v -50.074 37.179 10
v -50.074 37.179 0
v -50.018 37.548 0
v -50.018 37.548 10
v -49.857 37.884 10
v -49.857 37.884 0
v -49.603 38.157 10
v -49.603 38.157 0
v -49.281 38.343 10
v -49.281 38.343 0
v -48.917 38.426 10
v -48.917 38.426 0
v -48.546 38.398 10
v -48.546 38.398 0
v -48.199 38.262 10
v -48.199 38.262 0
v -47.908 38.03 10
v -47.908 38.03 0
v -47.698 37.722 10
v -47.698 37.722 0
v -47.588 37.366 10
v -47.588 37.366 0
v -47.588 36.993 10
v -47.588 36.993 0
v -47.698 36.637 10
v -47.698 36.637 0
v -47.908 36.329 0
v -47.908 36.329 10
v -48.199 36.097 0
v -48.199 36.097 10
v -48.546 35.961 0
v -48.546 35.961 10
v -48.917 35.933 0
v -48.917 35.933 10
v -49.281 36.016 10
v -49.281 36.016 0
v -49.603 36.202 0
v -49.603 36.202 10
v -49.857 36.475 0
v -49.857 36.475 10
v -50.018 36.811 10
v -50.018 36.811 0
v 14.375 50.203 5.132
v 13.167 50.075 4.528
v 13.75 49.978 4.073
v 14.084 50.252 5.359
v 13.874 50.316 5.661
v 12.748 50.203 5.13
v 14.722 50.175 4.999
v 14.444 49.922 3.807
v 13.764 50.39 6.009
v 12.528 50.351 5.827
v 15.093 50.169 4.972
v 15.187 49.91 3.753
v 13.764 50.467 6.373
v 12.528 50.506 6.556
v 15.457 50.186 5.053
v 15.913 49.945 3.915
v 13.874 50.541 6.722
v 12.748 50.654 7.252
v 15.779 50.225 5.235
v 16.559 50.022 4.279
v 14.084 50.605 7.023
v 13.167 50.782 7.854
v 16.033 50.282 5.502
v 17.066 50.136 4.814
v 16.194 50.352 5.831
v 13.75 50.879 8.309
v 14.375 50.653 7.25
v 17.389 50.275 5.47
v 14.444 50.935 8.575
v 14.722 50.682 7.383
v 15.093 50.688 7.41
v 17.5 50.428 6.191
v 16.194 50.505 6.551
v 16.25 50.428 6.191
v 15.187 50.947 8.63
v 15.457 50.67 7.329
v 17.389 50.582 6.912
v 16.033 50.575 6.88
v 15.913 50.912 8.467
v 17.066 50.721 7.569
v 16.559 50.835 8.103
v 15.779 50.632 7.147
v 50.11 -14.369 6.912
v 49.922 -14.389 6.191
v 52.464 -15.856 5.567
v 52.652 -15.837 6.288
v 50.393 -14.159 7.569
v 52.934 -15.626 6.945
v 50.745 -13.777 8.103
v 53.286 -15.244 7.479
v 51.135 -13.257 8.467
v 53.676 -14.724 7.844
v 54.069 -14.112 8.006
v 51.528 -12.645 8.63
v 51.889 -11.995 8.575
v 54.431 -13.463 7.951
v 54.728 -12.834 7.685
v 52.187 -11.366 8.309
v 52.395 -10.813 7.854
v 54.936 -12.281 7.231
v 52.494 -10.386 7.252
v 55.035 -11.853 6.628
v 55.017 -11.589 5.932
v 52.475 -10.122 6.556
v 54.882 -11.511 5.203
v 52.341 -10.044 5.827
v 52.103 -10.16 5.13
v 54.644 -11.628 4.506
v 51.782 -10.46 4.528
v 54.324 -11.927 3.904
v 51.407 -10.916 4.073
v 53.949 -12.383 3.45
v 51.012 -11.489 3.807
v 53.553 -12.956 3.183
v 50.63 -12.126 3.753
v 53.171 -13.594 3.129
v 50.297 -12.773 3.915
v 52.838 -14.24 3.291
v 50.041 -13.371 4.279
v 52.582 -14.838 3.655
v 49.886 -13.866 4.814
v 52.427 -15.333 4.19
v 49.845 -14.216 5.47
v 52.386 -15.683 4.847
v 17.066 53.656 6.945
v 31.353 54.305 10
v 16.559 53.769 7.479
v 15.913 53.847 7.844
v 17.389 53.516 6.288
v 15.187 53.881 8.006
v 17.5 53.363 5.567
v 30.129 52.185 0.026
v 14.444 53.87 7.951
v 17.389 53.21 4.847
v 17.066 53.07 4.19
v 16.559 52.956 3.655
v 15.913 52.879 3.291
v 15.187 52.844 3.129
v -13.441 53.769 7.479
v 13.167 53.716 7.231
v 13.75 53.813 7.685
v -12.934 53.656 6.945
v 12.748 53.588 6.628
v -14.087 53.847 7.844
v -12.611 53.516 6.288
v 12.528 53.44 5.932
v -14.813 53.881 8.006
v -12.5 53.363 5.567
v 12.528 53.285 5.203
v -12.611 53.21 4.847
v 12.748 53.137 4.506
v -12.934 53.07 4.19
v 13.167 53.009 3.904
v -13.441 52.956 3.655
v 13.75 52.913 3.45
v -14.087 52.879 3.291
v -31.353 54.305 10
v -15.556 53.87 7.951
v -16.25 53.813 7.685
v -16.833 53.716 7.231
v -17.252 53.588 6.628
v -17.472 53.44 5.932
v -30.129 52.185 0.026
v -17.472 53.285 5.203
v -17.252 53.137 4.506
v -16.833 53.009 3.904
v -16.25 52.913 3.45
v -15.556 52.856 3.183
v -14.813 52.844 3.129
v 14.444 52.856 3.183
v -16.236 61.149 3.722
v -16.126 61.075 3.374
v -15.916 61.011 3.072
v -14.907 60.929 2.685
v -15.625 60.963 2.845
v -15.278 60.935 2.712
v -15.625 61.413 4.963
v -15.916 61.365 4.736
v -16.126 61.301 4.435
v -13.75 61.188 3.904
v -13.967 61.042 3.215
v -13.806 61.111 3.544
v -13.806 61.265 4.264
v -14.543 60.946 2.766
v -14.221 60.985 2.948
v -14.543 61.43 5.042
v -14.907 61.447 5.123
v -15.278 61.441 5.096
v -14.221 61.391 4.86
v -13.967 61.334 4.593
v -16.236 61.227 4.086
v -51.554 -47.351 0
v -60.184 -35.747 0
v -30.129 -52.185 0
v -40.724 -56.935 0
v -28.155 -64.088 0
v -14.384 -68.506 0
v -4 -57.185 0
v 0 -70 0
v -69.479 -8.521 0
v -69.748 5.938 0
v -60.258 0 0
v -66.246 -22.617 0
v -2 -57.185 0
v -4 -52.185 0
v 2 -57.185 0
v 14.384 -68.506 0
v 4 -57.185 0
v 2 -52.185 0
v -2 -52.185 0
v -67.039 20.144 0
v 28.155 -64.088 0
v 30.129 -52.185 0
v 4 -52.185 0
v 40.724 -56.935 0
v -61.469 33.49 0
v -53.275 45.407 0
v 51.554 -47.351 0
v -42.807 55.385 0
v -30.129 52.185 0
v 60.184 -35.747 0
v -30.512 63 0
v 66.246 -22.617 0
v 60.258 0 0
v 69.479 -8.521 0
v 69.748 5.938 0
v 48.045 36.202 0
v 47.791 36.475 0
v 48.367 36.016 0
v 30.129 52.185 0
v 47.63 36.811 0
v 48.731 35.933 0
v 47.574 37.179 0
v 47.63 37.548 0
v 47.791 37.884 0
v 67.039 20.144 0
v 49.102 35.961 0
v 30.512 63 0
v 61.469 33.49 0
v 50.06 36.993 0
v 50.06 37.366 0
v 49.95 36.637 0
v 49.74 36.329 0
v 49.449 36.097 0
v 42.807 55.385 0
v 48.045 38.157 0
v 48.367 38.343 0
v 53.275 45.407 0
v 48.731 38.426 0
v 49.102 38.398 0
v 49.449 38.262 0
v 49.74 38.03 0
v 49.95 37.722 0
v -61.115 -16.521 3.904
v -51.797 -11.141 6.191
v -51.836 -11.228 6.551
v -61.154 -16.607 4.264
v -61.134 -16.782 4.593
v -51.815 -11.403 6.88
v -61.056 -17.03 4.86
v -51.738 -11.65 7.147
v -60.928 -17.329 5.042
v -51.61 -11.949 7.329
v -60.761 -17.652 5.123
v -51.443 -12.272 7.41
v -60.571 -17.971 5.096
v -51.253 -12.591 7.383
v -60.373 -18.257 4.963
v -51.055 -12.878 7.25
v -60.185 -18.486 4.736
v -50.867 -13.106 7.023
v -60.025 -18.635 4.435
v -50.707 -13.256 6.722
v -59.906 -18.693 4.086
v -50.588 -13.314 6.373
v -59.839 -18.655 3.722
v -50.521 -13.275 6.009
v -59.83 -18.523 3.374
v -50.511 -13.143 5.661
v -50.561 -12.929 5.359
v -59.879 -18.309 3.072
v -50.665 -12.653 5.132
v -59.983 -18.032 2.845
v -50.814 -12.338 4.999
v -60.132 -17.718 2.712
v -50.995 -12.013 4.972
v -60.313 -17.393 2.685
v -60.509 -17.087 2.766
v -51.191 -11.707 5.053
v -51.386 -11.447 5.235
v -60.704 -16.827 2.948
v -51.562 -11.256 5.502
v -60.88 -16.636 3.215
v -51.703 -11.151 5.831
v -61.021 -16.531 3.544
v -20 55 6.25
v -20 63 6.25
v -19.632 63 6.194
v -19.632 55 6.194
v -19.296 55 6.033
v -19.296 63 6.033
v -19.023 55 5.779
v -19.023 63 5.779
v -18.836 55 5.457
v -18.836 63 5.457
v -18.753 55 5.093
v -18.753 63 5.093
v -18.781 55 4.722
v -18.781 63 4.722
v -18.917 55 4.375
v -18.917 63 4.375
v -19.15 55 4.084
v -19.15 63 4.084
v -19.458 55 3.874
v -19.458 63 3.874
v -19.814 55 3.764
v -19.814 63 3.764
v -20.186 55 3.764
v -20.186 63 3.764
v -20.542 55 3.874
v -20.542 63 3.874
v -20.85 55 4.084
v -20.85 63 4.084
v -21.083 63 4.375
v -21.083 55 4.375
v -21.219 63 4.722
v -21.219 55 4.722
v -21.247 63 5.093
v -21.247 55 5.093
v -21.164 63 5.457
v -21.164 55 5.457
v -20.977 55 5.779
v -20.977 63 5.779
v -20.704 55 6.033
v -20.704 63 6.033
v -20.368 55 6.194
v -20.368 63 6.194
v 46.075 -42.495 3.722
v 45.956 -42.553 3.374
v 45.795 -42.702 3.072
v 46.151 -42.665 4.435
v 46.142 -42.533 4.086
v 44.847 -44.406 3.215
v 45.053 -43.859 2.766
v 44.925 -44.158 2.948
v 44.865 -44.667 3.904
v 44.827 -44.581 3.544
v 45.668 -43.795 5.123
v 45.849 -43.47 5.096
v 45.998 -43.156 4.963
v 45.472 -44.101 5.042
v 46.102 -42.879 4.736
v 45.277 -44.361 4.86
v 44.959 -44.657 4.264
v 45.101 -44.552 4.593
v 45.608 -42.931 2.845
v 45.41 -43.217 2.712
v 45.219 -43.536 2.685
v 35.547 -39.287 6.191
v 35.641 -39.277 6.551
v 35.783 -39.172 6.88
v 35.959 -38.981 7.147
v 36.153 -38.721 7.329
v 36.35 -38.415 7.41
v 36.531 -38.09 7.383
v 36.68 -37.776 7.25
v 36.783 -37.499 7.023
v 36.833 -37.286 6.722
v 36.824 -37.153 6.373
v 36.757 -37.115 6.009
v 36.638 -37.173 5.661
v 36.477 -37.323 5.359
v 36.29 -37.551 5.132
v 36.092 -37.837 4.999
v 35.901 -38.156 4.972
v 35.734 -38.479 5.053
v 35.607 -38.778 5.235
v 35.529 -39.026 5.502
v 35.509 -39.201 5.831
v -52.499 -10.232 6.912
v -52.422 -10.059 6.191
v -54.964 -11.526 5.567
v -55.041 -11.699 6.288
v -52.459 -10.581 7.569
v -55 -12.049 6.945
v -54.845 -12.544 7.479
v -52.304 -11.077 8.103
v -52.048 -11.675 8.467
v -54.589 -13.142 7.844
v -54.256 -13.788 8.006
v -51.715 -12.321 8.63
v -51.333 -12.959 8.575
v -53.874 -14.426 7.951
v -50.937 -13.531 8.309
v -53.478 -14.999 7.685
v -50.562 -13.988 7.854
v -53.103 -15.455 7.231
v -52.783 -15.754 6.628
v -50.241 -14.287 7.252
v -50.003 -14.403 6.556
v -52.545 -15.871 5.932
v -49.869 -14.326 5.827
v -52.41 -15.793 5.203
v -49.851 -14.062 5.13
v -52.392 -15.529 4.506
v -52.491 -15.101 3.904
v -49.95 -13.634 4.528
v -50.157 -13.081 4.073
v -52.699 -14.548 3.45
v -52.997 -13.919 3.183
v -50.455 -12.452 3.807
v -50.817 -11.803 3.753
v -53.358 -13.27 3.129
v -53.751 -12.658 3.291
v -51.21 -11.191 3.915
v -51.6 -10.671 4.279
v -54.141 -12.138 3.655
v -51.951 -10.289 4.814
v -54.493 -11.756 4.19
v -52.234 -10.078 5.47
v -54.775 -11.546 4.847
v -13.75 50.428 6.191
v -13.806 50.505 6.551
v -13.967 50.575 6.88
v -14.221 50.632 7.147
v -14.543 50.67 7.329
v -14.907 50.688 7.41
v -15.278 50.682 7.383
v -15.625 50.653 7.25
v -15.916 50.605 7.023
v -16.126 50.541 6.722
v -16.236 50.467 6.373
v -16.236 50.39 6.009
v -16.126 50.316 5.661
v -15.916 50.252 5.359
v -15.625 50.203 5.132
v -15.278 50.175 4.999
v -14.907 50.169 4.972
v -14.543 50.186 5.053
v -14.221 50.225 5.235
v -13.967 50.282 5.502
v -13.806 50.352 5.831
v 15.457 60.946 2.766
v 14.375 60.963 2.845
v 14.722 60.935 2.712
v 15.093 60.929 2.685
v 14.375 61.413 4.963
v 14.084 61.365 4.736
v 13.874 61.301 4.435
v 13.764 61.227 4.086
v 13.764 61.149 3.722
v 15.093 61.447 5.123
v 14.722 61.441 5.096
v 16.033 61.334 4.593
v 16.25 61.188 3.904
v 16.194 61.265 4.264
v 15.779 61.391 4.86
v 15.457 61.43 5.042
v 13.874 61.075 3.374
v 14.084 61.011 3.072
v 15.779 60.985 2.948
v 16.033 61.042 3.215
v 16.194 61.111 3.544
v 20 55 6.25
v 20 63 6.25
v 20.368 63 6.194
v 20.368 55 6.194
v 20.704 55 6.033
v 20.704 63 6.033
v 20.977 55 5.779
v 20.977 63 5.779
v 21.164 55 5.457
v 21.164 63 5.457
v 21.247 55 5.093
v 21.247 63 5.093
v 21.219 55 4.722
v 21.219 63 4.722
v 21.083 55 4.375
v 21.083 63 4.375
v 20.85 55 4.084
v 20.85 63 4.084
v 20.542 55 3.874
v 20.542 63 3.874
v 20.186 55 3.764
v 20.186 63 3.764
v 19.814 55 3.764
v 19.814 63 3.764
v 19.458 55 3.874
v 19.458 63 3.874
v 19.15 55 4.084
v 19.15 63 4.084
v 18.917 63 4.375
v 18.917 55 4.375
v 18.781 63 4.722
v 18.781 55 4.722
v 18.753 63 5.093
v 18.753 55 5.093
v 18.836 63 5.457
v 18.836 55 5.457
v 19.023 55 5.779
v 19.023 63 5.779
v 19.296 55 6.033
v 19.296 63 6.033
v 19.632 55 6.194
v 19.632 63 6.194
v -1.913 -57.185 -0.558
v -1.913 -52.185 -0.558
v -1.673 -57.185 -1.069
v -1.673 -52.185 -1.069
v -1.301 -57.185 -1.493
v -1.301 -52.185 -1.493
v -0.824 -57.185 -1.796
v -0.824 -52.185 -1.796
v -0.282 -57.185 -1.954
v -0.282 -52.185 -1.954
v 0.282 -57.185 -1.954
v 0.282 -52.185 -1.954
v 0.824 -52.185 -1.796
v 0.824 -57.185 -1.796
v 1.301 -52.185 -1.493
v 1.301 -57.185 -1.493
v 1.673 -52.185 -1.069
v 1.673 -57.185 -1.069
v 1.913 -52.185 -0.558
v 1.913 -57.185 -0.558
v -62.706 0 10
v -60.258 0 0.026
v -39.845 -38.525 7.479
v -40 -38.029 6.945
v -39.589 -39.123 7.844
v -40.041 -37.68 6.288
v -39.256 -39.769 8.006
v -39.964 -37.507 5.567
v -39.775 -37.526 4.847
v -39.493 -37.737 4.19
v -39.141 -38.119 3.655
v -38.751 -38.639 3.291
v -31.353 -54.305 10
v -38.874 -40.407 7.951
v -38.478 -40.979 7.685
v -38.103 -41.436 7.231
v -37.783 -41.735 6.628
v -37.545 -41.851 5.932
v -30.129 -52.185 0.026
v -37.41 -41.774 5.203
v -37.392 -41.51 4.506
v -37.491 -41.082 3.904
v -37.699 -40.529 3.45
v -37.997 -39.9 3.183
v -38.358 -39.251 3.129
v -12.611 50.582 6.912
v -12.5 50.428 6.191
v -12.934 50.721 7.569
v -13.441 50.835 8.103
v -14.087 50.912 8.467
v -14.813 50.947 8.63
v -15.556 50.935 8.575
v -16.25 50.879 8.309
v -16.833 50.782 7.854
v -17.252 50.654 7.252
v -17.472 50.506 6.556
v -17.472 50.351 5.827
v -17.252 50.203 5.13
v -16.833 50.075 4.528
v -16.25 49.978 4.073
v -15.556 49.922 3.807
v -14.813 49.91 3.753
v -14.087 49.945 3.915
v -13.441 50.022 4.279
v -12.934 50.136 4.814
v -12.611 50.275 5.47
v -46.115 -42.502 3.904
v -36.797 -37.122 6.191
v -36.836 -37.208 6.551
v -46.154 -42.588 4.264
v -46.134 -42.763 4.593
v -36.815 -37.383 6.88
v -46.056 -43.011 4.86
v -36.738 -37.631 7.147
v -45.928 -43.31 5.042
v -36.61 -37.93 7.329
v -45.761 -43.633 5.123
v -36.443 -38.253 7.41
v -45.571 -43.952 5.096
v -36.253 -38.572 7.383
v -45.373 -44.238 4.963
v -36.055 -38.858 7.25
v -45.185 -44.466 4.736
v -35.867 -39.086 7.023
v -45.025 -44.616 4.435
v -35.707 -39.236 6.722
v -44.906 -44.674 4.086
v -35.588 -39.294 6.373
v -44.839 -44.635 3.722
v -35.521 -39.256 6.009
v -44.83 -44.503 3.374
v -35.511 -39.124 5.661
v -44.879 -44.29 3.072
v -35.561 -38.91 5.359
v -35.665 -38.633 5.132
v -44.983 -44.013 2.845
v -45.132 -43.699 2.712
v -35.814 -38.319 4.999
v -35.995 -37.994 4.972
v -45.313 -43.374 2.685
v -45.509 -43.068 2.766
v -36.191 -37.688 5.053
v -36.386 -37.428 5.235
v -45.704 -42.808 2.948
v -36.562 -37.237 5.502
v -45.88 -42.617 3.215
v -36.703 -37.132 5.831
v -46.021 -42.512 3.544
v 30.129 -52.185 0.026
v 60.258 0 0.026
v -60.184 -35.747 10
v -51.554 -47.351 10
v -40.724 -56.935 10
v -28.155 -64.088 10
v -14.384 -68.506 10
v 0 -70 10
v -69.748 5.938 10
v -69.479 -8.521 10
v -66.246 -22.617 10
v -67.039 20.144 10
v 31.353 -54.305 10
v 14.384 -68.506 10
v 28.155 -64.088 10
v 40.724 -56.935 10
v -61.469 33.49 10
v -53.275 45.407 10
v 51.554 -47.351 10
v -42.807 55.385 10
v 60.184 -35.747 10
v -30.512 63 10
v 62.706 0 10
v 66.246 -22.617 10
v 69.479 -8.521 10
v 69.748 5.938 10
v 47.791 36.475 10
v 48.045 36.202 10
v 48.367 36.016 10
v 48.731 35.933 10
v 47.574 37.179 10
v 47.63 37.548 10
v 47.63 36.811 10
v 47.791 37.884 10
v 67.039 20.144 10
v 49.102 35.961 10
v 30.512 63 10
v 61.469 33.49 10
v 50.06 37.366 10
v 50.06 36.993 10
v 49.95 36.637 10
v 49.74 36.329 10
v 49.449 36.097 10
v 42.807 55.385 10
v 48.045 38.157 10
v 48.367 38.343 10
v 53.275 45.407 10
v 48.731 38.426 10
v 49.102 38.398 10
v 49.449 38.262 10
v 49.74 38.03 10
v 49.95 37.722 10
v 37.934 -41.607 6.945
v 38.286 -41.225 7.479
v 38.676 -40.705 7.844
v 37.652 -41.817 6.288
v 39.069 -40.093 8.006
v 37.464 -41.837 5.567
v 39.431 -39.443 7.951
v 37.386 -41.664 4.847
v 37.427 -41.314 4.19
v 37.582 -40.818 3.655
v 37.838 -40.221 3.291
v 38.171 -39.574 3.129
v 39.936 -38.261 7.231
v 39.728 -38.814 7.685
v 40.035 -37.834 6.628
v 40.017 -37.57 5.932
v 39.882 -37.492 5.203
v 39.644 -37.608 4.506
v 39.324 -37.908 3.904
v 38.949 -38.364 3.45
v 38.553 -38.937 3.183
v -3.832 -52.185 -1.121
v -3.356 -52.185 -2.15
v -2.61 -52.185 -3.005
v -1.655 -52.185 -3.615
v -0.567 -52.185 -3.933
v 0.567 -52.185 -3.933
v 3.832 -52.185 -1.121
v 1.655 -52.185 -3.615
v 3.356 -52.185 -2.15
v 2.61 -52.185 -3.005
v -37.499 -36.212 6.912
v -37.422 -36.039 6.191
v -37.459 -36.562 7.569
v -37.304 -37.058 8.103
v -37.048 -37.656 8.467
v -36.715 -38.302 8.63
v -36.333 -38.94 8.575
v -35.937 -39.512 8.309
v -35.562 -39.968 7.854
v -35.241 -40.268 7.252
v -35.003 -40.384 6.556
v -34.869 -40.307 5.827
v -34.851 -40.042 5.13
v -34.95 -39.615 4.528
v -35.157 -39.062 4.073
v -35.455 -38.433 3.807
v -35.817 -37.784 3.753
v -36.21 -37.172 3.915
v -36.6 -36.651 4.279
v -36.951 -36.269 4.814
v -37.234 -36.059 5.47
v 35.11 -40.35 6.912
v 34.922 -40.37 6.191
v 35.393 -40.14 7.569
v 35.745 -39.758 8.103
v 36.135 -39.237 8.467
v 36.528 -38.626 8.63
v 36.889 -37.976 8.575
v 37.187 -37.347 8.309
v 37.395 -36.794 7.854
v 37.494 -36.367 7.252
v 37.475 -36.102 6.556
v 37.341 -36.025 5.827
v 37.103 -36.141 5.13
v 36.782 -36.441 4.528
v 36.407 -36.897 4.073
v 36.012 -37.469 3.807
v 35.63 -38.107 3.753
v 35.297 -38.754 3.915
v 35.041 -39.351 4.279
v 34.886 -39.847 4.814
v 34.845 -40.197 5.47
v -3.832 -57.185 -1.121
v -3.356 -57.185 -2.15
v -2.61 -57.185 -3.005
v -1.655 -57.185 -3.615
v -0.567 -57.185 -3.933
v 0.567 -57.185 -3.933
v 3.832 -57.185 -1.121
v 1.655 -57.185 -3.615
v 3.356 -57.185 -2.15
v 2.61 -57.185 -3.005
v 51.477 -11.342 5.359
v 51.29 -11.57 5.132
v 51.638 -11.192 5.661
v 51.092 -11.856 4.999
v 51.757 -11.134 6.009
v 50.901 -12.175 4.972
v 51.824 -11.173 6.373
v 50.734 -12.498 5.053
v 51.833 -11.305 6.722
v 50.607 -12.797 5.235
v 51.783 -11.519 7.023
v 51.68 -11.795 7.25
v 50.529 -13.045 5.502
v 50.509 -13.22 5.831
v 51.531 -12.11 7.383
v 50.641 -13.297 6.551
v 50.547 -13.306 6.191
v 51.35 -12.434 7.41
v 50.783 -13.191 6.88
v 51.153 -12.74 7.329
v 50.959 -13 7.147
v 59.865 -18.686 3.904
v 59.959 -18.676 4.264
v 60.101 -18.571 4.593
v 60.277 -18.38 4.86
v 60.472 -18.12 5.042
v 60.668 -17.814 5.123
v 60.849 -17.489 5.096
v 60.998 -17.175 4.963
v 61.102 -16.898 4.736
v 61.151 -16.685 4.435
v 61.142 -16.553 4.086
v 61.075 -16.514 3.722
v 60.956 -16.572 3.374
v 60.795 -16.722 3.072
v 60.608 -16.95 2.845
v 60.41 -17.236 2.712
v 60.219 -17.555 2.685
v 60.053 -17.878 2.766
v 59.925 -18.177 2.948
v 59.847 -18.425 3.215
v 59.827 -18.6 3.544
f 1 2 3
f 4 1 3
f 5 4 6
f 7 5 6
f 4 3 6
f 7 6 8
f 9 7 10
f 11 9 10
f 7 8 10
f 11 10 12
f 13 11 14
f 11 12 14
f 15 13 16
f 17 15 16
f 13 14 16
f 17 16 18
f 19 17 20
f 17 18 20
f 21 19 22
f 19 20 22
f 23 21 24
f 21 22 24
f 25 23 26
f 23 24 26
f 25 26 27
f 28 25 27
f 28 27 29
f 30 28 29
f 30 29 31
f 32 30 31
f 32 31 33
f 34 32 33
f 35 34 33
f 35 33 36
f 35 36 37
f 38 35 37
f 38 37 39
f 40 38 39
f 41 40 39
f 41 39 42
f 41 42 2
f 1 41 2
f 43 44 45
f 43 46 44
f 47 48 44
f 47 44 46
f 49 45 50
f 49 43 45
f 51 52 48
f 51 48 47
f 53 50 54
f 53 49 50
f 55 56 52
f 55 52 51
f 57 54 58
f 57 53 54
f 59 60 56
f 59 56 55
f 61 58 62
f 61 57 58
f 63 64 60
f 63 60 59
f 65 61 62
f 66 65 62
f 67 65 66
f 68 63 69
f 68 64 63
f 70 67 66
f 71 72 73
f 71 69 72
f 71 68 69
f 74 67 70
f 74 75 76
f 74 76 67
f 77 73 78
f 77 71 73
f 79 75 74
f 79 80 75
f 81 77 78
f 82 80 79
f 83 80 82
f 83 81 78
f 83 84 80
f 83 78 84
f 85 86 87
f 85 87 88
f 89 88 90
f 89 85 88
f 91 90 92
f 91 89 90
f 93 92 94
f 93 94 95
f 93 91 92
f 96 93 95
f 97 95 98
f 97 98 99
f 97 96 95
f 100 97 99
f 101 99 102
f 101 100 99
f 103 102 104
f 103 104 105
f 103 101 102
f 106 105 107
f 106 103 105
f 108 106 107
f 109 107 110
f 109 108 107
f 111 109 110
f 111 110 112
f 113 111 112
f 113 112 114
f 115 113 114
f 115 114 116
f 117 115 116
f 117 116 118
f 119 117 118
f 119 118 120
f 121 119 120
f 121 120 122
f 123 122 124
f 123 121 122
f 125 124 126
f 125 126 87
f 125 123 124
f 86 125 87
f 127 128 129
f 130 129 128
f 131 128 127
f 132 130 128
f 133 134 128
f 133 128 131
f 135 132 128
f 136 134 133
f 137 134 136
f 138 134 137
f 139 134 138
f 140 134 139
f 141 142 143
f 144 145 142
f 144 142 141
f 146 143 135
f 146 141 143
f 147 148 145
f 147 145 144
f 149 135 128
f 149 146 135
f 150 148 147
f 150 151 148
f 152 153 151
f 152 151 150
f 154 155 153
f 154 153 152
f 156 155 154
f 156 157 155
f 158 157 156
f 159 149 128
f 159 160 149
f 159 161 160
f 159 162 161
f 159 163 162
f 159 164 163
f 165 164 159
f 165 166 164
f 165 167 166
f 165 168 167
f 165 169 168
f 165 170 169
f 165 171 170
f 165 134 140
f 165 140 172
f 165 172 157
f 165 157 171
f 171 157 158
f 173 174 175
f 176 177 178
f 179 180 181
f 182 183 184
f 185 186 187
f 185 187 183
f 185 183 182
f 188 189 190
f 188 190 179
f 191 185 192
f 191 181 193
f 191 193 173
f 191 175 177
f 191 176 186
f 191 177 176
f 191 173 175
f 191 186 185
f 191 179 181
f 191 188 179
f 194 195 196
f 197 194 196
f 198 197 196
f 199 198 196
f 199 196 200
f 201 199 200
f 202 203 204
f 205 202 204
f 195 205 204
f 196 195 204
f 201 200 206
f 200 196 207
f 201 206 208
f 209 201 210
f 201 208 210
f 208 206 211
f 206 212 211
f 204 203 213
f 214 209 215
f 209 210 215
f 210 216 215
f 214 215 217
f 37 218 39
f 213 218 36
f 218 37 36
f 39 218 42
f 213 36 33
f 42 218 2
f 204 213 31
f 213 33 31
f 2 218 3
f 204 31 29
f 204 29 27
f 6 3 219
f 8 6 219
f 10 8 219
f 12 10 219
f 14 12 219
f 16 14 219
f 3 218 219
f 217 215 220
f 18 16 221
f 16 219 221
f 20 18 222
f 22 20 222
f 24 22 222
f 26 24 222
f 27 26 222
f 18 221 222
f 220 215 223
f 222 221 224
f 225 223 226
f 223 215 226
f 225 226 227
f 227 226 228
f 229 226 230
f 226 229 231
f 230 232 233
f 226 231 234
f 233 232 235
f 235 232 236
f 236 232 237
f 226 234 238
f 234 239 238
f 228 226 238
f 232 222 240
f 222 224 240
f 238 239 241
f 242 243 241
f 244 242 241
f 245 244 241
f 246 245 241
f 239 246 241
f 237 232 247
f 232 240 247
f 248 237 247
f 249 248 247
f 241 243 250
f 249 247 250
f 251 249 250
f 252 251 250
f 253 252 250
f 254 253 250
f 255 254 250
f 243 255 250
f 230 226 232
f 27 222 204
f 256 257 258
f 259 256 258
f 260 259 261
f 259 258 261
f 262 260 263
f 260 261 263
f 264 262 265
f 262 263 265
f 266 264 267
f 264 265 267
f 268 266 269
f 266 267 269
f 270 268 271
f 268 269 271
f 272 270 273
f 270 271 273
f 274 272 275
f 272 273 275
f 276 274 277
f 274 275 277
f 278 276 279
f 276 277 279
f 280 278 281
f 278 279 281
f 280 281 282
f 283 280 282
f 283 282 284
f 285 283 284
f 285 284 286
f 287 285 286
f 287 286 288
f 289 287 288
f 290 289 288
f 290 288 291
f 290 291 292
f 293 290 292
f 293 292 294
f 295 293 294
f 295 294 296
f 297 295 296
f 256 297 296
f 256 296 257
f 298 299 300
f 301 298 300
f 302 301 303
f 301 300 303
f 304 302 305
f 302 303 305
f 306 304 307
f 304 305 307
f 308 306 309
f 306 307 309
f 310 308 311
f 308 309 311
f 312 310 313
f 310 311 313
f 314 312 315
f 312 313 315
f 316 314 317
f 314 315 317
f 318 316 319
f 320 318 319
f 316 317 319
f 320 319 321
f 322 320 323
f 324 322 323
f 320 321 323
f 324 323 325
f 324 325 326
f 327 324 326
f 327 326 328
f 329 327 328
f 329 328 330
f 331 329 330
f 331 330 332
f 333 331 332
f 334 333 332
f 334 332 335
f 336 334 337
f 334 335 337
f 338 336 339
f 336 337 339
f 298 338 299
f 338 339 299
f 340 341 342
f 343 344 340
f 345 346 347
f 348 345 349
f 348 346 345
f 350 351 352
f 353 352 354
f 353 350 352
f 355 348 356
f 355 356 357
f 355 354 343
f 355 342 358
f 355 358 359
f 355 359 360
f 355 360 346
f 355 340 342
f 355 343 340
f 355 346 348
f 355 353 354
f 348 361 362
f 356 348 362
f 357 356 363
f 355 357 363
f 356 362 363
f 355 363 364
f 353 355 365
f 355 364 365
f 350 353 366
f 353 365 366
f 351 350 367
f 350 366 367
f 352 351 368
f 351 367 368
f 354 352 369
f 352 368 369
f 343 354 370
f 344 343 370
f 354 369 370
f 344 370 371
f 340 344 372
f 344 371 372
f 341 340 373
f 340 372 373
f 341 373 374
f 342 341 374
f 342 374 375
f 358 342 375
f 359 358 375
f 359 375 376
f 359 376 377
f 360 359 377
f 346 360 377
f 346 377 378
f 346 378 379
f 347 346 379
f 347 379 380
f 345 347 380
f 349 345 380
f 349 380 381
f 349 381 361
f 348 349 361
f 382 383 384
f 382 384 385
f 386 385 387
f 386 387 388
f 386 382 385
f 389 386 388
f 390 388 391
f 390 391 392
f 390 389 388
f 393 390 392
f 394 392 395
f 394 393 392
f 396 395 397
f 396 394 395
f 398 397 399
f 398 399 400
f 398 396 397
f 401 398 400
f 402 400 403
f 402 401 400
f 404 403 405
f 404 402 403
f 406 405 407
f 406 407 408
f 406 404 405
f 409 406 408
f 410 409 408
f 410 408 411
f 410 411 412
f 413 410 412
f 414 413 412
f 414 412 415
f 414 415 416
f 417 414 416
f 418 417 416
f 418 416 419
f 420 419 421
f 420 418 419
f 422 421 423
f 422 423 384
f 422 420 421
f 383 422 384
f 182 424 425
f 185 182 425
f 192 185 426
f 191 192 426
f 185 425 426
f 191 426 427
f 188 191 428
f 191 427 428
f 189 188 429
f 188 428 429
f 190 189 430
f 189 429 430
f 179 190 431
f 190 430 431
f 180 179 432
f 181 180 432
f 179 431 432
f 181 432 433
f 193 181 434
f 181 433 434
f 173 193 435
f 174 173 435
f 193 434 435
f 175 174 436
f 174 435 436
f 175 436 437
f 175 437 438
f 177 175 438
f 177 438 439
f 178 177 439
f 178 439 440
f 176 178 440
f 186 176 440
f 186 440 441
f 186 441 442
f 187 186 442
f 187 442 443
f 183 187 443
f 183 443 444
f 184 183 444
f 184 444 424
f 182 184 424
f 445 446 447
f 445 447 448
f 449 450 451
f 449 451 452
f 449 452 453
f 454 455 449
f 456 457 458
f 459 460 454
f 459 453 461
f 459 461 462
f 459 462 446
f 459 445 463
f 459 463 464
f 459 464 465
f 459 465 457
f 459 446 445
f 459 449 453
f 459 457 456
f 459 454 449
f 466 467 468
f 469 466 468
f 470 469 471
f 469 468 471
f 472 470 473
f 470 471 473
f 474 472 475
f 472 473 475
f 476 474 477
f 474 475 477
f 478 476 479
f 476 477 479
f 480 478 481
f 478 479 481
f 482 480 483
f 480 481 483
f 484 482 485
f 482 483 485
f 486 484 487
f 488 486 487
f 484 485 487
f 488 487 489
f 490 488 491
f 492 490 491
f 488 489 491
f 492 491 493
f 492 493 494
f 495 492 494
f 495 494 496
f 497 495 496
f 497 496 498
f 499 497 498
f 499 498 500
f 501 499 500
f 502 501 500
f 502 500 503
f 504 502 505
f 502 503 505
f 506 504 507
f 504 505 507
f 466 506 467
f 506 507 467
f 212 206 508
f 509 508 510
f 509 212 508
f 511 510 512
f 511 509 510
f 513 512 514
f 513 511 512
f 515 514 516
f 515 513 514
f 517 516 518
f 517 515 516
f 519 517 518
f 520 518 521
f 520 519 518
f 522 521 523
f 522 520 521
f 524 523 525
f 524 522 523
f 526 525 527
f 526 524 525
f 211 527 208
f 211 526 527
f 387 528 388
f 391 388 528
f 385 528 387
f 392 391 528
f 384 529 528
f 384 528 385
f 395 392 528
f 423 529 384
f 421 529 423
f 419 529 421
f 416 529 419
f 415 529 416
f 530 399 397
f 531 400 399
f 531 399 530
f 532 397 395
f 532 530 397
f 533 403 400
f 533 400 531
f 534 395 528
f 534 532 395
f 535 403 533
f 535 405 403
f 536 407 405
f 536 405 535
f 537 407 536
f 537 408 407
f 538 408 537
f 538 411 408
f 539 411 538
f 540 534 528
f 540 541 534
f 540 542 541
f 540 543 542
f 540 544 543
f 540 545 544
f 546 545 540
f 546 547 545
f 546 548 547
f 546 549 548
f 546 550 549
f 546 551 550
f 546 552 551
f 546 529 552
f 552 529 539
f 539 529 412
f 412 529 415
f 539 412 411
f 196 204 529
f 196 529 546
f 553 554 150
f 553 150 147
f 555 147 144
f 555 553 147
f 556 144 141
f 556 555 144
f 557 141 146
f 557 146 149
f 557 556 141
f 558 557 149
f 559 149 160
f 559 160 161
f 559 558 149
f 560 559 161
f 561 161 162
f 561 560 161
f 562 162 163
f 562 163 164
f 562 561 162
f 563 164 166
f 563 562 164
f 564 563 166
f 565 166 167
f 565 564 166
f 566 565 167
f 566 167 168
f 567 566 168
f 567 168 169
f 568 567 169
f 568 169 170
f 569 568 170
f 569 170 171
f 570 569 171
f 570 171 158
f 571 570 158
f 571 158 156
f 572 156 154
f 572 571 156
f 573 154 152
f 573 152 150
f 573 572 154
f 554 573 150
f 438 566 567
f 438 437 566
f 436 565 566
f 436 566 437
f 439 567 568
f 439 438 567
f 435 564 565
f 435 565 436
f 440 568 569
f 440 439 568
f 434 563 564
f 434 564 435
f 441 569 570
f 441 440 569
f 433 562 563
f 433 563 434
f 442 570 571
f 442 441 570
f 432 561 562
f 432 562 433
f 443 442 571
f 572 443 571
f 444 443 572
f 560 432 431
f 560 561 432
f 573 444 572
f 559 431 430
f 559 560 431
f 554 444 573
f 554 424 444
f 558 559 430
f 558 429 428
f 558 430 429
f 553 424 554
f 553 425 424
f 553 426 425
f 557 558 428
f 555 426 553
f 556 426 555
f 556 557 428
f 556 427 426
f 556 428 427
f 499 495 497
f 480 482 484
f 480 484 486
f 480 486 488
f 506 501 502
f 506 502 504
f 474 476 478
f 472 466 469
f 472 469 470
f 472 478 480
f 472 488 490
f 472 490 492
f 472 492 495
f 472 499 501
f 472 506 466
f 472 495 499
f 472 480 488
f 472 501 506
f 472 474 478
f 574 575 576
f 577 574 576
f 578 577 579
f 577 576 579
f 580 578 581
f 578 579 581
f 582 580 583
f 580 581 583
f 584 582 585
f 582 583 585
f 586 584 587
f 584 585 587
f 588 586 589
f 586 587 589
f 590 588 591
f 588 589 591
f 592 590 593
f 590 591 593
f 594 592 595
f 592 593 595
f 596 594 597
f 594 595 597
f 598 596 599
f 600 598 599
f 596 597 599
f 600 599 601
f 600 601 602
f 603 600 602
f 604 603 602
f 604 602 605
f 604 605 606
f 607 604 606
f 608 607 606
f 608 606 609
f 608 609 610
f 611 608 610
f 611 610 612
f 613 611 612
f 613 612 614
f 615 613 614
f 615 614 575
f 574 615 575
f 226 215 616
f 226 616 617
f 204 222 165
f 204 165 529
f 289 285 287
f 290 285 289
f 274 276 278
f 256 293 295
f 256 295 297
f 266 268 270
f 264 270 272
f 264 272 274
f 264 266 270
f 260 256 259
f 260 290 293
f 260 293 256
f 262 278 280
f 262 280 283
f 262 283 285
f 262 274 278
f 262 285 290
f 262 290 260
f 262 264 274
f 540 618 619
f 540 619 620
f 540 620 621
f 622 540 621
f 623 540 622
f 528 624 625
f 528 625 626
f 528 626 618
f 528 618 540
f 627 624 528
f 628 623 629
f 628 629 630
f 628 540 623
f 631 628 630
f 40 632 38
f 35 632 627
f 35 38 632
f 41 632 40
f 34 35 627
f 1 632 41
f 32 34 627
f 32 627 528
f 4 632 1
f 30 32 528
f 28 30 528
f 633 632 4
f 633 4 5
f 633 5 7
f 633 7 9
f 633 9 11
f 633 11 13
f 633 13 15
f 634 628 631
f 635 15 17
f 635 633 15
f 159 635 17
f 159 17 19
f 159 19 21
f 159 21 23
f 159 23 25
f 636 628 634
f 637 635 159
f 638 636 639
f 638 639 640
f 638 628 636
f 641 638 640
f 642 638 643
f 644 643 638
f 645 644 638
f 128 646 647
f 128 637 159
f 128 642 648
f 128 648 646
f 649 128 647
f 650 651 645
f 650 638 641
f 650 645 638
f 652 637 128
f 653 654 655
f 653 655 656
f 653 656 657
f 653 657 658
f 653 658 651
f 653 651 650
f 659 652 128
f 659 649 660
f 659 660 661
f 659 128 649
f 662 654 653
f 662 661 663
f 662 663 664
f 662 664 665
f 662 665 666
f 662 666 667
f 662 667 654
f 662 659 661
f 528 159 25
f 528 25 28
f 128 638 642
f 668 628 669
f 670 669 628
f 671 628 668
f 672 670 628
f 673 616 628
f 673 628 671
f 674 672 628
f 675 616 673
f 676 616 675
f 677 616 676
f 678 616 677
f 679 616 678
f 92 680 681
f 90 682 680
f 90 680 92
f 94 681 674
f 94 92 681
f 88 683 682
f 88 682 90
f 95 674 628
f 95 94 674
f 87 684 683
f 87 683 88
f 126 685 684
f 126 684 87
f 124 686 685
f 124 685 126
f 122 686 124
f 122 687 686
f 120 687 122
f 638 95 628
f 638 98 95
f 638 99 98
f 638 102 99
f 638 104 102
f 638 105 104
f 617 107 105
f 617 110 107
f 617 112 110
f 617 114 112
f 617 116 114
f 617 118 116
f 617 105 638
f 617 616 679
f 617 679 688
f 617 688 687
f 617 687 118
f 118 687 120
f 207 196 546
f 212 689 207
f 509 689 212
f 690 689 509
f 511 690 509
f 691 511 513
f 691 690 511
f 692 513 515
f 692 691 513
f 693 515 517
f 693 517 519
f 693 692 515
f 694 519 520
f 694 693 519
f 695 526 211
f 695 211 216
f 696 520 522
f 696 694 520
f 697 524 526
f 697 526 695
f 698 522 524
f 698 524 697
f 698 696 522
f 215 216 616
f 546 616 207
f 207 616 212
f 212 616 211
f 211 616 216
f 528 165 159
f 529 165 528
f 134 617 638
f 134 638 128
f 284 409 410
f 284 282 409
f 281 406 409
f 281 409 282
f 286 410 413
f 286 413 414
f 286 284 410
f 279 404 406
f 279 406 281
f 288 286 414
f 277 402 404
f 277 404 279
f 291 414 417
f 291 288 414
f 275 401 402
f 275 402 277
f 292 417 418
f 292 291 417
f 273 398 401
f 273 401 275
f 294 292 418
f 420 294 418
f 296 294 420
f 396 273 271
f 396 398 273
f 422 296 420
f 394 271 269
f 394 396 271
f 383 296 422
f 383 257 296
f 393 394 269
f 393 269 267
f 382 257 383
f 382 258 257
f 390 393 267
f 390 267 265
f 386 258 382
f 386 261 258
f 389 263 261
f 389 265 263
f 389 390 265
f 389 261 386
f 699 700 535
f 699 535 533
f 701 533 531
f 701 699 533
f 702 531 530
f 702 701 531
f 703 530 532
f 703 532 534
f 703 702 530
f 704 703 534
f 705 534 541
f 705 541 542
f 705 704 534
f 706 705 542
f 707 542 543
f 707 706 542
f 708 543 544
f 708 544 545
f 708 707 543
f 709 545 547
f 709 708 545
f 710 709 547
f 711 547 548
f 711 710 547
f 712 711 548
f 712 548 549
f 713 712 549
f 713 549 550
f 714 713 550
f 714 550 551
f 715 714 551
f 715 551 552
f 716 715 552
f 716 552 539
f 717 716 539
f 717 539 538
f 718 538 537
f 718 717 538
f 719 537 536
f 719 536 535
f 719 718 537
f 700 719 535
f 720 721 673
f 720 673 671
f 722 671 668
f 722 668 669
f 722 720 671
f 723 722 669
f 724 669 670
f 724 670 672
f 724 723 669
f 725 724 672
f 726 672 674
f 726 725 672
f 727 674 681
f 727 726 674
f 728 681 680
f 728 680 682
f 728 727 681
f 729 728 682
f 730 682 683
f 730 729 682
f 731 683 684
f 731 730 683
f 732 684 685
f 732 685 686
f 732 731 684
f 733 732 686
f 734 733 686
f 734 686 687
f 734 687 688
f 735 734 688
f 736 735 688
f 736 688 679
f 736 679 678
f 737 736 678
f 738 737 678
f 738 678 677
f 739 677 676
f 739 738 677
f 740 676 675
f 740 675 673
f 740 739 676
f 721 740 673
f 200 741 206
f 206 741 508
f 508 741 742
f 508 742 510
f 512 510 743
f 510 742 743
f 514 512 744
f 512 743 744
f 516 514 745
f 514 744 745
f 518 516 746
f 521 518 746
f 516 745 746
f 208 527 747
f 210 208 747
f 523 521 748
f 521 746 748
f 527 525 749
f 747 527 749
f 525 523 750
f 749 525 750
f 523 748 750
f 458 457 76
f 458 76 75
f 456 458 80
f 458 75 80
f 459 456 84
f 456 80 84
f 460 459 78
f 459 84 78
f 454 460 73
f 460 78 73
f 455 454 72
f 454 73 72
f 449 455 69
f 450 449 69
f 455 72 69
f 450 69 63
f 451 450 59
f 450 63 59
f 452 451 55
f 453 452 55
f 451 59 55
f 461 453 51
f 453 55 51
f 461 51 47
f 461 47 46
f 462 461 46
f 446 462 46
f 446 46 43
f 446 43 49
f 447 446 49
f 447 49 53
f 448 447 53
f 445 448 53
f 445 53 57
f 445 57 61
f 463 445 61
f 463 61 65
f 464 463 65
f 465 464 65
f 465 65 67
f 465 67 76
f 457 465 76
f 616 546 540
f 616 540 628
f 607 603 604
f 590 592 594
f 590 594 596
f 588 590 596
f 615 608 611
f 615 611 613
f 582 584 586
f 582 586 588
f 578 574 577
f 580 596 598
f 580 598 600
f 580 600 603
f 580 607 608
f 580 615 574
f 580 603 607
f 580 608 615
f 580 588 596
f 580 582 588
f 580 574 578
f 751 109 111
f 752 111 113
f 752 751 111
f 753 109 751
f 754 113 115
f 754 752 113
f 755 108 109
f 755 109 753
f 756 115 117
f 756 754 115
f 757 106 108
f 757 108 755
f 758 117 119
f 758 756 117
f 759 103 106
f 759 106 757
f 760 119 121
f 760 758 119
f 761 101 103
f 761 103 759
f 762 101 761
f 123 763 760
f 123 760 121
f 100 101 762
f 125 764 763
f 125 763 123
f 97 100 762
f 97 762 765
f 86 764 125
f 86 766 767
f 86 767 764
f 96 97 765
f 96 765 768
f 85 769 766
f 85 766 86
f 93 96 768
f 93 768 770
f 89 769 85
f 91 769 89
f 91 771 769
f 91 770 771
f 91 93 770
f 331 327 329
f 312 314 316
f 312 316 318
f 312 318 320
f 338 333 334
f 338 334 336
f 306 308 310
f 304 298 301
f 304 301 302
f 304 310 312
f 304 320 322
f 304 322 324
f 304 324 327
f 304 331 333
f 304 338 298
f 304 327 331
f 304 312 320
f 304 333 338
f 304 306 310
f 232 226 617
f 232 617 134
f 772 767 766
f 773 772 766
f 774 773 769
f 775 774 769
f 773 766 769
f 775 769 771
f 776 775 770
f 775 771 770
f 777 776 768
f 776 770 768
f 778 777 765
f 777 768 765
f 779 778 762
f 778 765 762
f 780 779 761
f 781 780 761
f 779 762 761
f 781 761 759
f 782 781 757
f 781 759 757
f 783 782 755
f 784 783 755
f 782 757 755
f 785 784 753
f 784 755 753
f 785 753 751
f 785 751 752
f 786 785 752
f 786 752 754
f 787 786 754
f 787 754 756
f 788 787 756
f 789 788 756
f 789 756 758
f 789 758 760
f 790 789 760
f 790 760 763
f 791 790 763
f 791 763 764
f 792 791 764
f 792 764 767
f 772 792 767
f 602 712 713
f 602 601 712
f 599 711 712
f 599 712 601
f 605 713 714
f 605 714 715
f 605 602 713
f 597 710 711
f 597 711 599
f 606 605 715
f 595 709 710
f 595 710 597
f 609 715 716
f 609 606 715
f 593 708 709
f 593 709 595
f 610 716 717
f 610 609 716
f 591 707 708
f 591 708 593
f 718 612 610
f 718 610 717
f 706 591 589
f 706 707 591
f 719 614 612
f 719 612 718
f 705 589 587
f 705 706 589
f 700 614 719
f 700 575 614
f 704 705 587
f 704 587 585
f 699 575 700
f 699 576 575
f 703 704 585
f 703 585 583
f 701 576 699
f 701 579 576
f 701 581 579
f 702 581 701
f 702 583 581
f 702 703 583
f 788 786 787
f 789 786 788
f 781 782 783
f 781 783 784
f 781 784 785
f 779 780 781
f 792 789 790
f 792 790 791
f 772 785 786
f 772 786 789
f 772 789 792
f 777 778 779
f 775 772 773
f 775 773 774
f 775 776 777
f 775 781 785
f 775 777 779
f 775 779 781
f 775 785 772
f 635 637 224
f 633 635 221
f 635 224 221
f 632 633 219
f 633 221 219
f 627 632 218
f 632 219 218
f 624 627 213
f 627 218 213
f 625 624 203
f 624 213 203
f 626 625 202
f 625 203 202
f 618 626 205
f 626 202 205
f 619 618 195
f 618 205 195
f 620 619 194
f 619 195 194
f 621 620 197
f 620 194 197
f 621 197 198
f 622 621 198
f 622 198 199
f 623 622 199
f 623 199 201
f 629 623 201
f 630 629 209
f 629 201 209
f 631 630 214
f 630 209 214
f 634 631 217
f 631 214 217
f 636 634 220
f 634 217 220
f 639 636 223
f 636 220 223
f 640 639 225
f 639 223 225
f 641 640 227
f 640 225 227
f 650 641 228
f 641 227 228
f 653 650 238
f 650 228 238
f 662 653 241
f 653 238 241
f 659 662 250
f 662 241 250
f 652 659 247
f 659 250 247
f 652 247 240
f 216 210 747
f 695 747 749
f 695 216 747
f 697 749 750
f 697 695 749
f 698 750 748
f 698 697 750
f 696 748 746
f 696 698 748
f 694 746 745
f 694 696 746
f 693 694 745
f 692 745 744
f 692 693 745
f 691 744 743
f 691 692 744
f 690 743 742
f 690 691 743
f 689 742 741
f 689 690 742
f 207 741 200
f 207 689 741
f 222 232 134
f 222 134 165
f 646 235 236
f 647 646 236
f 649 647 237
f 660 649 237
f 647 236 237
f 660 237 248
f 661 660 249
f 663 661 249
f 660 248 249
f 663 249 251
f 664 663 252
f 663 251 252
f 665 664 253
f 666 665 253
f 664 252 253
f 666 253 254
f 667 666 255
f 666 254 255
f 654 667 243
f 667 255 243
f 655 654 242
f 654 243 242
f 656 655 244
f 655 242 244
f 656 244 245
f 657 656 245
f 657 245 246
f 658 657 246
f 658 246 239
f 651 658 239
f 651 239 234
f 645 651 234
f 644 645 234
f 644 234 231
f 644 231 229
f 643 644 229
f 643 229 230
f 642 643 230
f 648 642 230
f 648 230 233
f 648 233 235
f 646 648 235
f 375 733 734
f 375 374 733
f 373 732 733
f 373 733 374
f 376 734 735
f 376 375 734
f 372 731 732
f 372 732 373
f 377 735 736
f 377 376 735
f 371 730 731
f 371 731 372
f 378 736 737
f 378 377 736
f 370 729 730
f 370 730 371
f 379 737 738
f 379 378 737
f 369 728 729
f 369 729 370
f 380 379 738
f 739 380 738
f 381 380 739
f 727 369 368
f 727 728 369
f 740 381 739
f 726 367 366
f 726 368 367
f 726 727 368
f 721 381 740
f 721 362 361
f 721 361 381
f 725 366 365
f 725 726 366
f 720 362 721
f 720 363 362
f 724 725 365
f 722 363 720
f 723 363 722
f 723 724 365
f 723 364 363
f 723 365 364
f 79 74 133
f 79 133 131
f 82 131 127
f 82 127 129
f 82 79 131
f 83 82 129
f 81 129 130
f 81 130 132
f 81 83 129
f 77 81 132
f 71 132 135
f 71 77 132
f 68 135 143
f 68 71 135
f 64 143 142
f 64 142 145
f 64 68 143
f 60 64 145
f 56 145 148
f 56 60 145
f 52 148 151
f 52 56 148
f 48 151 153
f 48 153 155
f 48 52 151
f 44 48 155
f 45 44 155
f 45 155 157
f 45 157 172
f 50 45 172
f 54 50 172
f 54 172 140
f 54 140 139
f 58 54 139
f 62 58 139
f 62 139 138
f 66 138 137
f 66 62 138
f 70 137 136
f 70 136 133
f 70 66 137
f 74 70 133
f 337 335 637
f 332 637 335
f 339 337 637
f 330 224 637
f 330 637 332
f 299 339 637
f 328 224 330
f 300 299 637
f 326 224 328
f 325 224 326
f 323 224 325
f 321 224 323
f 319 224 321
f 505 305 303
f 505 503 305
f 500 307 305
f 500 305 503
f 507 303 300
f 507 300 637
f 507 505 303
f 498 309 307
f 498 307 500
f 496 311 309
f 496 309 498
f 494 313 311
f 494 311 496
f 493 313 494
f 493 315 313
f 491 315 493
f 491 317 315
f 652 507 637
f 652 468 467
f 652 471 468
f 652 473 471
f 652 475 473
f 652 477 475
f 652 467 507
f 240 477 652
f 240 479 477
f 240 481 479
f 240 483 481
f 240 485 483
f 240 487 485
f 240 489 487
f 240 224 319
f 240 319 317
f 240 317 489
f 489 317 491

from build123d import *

# Parameters (mm, degrees)
ESQUISSE1_R                  = 70
BOSS_EXTRU_1_DEPTH           = 10
CHANFREIN1_SIZE              = 2.12
CHANFREIN1_SIZE2             = 9.973815832
ESQUISSE2_R                  = 1.25
ENL_V_MAT_EXTRU_1_DEPTH      = 8
BOSS_EXTRU_2_START           = 3
ESQUISSE3_R                  = 2.5
ESQUISSE3_R_2                = 1.25
BOSS_EXTRU_2_DEPTH           = 3
R_P_TITION_CIRCULAIRE1_COUNT = 3
ENL_V_MAT_EXTRU_2_REACH      = 101.499
ESQUISSE5_R                  = 1.25
ENL_V_MAT_EXTRU_3_DEPTH      = 8
ENL_V_MAT_EXTRU_4_REACH      = 101.499
ESQUISSE6_R                  = 1.25
BOSS_EXTRU_3_DEPTH           = 5


with BuildPart() as part:
    # Esquisse1 → Boss.-Extru.1 (new body)
    with BuildSketch(Plane.XY):
        Circle(ESQUISSE1_R)
        Polygon((60.258047595, 0), (30.129023798, 52.185), (-30.129023798, 52.185), (-60.258047595, 0), (-30.129023798, -52.185), (30.129023798, -52.185), align=None, mode=Mode.SUBTRACT)
    extrude(amount=BOSS_EXTRU_1_DEPTH)

    # Chanfrein1
    chanfrein1_edges = [part.edges().sort_by_distance(p)[0] for p in [
        (45.193535696, -26.0925, 10),
        (45.193535696, 26.0925, 10),
        (0, 52.185, 10),
        (-45.193535696, 26.0925, 10),
        (-45.193535696, -26.0925, 10),
        (0, -52.185, 10),
    ]]
    chanfrein1_side = [part.faces().sort_by_distance(p)[0] for p in [
        (-68.020101013, 0, 10),
    ]]
    chamfer(chanfrein1_edges, length=CHANFREIN1_SIZE, length2=CHANFREIN1_SIZE2, reference=chanfrein1_side[0])

    # Esquisse2 → Enlèv. mat.-Extru.1 (cut)
    with BuildSketch(Plane(origin=(-43.235330862, -24.961929912, -10.611643989), x_dir=(0.1800568059919566, 0.10395584540888045, -0.9781476007338055), z_dir=(0.8471006708862736, 0.48907380036690296, 0.20791169081776076))):
        with Locations(Location((-16.540417403, 15, 0), (0, 0, 90))):
            Circle(ESQUISSE2_R)
        with Locations(Location((-16.540417403, -15, 0), (0, 0, 90))):
            Circle(ESQUISSE2_R)
    enl_v_mat_extru_1 = extrude(amount=-ENL_V_MAT_EXTRU_1_DEPTH, mode=Mode.SUBTRACT)

    # Esquisse3 → Boss.-Extru.2 (add)
    # profile 1 of 2: a face of its own
    with BuildSketch(Plane(origin=(-43.235330862, -24.961929912, -10.611643989), x_dir=(0.1800568059919566, 0.10395584540888045, -0.9781476007338055), z_dir=(0.8471006708862736, 0.48907380036690296, 0.20791169081776076)).offset(BOSS_EXTRU_2_START)):
        with Locations(Location((-16.540417403, -15, 0), (0, 0, 90))):
            Circle(ESQUISSE3_R)
        with Locations(Location((-16.540417403, -15, 0), (0, 0, 90))):
            Circle(ESQUISSE3_R_2, mode=Mode.SUBTRACT)
    # profile 2 of 2: a face of its own
    with BuildSketch(Plane(origin=(-43.235330862, -24.961929912, -10.611643989), x_dir=(0.1800568059919566, 0.10395584540888045, -0.9781476007338055), z_dir=(0.8471006708862736, 0.48907380036690296, 0.20791169081776076)).offset(BOSS_EXTRU_2_START)):
        with Locations(Location((-16.540417403, 15, 0), (0, 0, 90))):
            Circle(ESQUISSE3_R)
        with Locations(Location((-16.540417403, 15, 0), (0, 0, 90))):
            Circle(ESQUISSE3_R_2, mode=Mode.SUBTRACT)
    boss_extru_2 = extrude(amount=-BOSS_EXTRU_2_DEPTH)

    # Répétition circulaire1: Enlèv. mat.-Extru.1, Boss.-Extru.2 ×3 about axis
    r_p_tition_circulaire1_axis = Axis((0, 0, 0), (0, 0, 1))
    add([enl_v_mat_extru_1.rotate(r_p_tition_circulaire1_axis, i * 360 / R_P_TITION_CIRCULAIRE1_COUNT) for i in range(1, R_P_TITION_CIRCULAIRE1_COUNT)], mode=Mode.SUBTRACT)
    add([boss_extru_2.rotate(r_p_tition_circulaire1_axis, i * 360 / R_P_TITION_CIRCULAIRE1_COUNT) for i in range(1, R_P_TITION_CIRCULAIRE1_COUNT)])

    # Esquisse4 → Enlèv. mat.-Extru.2 (cut, up to next)
    with BuildSketch(Plane(origin=(0, 0, 0), x_dir=(-1, 0, 0), z_dir=(0, 0, -1)), mode=Mode.PRIVATE) as enl_v_mat_extru_2_sk1:
        with BuildLine():
            Line((30.512292605, 63), (-30.512292605, 63))
            ThreePointArc((-30.512292605, 63), (0, 70), (30.512292605, 63))
        make_face()
    enl_v_mat_extru_2_tool1 = extrude(enl_v_mat_extru_2_sk1.sketch, amount=-ENL_V_MAT_EXTRU_2_REACH, mode=Mode.PRIVATE) & part.part
    add(enl_v_mat_extru_2_tool1.solids().sort_by_distance((0, 65.812358, 0))[0], mode=Mode.SUBTRACT)

    # Esquisse5 → Enlèv. mat.-Extru.3 (cut)
    with BuildSketch(Plane(origin=(0, 63, 0), x_dir=(1, 0, 0), z_dir=(0, 1, 0))):
        with Locations(Location((-20, -5, 0), (0, 0, 270))):
            Circle(ESQUISSE5_R)
        with Locations(Location((20, -5, 0), (0, 0, 270))):
            Circle(ESQUISSE5_R)
    extrude(amount=-ENL_V_MAT_EXTRU_3_DEPTH, mode=Mode.SUBTRACT)

    # Esquisse6 → Enlèv. mat.-Extru.4 (cut, up to next)
    with BuildSketch(Plane(origin=(0, 0, 0), x_dir=(-1, 0, 0), z_dir=(0, 0, -1)), mode=Mode.PRIVATE) as enl_v_mat_extru_4_sk1:
        with Locations((48.823972226, 37.179434383)):
            Circle(ESQUISSE6_R)
    enl_v_mat_extru_4_tool1 = extrude(enl_v_mat_extru_4_sk1.sketch, amount=-ENL_V_MAT_EXTRU_4_REACH, mode=Mode.PRIVATE) & part.part
    # Esquisse6 → Enlèv. mat.-Extru.4 (cut, up to next)
    with BuildSketch(Plane(origin=(0, 0, 0), x_dir=(-1, 0, 0), z_dir=(0, 0, -1)), mode=Mode.PRIVATE) as enl_v_mat_extru_4_sk2:
        with Locations((-48.823972226, 37.179434383)):
            Circle(ESQUISSE6_R)
    enl_v_mat_extru_4_tool2 = extrude(enl_v_mat_extru_4_sk2.sketch, amount=-ENL_V_MAT_EXTRU_4_REACH, mode=Mode.PRIVATE) & part.part
    add(enl_v_mat_extru_4_tool1.solids().sort_by_distance((-48.823972, 37.179434, 0))[0], mode=Mode.SUBTRACT)
    add(enl_v_mat_extru_4_tool2.solids().sort_by_distance((48.823972, 37.179434, 0))[0], mode=Mode.SUBTRACT)

    # Esquisse7 → Boss.-Extru.3 (add)
    with BuildSketch(Plane(origin=(0, -52.185, 0), x_dir=(1, 0, 0), z_dir=(0, 1, 0))):
        with BuildLine():
            Line((2, -0.026184168), (4, -0.026184168))
            ThreePointArc((4, -0.026184168), (0, 3.973815832), (-4, -0.026184168))
            Line((-4, -0.026184168), (-2, -0.026184168))
            ThreePointArc((-2, -0.026184168), (0, 1.973815832), (2, -0.026184168))
        make_face()
    extrude(amount=-BOSS_EXTRU_3_DEPTH)


solid = part.part
